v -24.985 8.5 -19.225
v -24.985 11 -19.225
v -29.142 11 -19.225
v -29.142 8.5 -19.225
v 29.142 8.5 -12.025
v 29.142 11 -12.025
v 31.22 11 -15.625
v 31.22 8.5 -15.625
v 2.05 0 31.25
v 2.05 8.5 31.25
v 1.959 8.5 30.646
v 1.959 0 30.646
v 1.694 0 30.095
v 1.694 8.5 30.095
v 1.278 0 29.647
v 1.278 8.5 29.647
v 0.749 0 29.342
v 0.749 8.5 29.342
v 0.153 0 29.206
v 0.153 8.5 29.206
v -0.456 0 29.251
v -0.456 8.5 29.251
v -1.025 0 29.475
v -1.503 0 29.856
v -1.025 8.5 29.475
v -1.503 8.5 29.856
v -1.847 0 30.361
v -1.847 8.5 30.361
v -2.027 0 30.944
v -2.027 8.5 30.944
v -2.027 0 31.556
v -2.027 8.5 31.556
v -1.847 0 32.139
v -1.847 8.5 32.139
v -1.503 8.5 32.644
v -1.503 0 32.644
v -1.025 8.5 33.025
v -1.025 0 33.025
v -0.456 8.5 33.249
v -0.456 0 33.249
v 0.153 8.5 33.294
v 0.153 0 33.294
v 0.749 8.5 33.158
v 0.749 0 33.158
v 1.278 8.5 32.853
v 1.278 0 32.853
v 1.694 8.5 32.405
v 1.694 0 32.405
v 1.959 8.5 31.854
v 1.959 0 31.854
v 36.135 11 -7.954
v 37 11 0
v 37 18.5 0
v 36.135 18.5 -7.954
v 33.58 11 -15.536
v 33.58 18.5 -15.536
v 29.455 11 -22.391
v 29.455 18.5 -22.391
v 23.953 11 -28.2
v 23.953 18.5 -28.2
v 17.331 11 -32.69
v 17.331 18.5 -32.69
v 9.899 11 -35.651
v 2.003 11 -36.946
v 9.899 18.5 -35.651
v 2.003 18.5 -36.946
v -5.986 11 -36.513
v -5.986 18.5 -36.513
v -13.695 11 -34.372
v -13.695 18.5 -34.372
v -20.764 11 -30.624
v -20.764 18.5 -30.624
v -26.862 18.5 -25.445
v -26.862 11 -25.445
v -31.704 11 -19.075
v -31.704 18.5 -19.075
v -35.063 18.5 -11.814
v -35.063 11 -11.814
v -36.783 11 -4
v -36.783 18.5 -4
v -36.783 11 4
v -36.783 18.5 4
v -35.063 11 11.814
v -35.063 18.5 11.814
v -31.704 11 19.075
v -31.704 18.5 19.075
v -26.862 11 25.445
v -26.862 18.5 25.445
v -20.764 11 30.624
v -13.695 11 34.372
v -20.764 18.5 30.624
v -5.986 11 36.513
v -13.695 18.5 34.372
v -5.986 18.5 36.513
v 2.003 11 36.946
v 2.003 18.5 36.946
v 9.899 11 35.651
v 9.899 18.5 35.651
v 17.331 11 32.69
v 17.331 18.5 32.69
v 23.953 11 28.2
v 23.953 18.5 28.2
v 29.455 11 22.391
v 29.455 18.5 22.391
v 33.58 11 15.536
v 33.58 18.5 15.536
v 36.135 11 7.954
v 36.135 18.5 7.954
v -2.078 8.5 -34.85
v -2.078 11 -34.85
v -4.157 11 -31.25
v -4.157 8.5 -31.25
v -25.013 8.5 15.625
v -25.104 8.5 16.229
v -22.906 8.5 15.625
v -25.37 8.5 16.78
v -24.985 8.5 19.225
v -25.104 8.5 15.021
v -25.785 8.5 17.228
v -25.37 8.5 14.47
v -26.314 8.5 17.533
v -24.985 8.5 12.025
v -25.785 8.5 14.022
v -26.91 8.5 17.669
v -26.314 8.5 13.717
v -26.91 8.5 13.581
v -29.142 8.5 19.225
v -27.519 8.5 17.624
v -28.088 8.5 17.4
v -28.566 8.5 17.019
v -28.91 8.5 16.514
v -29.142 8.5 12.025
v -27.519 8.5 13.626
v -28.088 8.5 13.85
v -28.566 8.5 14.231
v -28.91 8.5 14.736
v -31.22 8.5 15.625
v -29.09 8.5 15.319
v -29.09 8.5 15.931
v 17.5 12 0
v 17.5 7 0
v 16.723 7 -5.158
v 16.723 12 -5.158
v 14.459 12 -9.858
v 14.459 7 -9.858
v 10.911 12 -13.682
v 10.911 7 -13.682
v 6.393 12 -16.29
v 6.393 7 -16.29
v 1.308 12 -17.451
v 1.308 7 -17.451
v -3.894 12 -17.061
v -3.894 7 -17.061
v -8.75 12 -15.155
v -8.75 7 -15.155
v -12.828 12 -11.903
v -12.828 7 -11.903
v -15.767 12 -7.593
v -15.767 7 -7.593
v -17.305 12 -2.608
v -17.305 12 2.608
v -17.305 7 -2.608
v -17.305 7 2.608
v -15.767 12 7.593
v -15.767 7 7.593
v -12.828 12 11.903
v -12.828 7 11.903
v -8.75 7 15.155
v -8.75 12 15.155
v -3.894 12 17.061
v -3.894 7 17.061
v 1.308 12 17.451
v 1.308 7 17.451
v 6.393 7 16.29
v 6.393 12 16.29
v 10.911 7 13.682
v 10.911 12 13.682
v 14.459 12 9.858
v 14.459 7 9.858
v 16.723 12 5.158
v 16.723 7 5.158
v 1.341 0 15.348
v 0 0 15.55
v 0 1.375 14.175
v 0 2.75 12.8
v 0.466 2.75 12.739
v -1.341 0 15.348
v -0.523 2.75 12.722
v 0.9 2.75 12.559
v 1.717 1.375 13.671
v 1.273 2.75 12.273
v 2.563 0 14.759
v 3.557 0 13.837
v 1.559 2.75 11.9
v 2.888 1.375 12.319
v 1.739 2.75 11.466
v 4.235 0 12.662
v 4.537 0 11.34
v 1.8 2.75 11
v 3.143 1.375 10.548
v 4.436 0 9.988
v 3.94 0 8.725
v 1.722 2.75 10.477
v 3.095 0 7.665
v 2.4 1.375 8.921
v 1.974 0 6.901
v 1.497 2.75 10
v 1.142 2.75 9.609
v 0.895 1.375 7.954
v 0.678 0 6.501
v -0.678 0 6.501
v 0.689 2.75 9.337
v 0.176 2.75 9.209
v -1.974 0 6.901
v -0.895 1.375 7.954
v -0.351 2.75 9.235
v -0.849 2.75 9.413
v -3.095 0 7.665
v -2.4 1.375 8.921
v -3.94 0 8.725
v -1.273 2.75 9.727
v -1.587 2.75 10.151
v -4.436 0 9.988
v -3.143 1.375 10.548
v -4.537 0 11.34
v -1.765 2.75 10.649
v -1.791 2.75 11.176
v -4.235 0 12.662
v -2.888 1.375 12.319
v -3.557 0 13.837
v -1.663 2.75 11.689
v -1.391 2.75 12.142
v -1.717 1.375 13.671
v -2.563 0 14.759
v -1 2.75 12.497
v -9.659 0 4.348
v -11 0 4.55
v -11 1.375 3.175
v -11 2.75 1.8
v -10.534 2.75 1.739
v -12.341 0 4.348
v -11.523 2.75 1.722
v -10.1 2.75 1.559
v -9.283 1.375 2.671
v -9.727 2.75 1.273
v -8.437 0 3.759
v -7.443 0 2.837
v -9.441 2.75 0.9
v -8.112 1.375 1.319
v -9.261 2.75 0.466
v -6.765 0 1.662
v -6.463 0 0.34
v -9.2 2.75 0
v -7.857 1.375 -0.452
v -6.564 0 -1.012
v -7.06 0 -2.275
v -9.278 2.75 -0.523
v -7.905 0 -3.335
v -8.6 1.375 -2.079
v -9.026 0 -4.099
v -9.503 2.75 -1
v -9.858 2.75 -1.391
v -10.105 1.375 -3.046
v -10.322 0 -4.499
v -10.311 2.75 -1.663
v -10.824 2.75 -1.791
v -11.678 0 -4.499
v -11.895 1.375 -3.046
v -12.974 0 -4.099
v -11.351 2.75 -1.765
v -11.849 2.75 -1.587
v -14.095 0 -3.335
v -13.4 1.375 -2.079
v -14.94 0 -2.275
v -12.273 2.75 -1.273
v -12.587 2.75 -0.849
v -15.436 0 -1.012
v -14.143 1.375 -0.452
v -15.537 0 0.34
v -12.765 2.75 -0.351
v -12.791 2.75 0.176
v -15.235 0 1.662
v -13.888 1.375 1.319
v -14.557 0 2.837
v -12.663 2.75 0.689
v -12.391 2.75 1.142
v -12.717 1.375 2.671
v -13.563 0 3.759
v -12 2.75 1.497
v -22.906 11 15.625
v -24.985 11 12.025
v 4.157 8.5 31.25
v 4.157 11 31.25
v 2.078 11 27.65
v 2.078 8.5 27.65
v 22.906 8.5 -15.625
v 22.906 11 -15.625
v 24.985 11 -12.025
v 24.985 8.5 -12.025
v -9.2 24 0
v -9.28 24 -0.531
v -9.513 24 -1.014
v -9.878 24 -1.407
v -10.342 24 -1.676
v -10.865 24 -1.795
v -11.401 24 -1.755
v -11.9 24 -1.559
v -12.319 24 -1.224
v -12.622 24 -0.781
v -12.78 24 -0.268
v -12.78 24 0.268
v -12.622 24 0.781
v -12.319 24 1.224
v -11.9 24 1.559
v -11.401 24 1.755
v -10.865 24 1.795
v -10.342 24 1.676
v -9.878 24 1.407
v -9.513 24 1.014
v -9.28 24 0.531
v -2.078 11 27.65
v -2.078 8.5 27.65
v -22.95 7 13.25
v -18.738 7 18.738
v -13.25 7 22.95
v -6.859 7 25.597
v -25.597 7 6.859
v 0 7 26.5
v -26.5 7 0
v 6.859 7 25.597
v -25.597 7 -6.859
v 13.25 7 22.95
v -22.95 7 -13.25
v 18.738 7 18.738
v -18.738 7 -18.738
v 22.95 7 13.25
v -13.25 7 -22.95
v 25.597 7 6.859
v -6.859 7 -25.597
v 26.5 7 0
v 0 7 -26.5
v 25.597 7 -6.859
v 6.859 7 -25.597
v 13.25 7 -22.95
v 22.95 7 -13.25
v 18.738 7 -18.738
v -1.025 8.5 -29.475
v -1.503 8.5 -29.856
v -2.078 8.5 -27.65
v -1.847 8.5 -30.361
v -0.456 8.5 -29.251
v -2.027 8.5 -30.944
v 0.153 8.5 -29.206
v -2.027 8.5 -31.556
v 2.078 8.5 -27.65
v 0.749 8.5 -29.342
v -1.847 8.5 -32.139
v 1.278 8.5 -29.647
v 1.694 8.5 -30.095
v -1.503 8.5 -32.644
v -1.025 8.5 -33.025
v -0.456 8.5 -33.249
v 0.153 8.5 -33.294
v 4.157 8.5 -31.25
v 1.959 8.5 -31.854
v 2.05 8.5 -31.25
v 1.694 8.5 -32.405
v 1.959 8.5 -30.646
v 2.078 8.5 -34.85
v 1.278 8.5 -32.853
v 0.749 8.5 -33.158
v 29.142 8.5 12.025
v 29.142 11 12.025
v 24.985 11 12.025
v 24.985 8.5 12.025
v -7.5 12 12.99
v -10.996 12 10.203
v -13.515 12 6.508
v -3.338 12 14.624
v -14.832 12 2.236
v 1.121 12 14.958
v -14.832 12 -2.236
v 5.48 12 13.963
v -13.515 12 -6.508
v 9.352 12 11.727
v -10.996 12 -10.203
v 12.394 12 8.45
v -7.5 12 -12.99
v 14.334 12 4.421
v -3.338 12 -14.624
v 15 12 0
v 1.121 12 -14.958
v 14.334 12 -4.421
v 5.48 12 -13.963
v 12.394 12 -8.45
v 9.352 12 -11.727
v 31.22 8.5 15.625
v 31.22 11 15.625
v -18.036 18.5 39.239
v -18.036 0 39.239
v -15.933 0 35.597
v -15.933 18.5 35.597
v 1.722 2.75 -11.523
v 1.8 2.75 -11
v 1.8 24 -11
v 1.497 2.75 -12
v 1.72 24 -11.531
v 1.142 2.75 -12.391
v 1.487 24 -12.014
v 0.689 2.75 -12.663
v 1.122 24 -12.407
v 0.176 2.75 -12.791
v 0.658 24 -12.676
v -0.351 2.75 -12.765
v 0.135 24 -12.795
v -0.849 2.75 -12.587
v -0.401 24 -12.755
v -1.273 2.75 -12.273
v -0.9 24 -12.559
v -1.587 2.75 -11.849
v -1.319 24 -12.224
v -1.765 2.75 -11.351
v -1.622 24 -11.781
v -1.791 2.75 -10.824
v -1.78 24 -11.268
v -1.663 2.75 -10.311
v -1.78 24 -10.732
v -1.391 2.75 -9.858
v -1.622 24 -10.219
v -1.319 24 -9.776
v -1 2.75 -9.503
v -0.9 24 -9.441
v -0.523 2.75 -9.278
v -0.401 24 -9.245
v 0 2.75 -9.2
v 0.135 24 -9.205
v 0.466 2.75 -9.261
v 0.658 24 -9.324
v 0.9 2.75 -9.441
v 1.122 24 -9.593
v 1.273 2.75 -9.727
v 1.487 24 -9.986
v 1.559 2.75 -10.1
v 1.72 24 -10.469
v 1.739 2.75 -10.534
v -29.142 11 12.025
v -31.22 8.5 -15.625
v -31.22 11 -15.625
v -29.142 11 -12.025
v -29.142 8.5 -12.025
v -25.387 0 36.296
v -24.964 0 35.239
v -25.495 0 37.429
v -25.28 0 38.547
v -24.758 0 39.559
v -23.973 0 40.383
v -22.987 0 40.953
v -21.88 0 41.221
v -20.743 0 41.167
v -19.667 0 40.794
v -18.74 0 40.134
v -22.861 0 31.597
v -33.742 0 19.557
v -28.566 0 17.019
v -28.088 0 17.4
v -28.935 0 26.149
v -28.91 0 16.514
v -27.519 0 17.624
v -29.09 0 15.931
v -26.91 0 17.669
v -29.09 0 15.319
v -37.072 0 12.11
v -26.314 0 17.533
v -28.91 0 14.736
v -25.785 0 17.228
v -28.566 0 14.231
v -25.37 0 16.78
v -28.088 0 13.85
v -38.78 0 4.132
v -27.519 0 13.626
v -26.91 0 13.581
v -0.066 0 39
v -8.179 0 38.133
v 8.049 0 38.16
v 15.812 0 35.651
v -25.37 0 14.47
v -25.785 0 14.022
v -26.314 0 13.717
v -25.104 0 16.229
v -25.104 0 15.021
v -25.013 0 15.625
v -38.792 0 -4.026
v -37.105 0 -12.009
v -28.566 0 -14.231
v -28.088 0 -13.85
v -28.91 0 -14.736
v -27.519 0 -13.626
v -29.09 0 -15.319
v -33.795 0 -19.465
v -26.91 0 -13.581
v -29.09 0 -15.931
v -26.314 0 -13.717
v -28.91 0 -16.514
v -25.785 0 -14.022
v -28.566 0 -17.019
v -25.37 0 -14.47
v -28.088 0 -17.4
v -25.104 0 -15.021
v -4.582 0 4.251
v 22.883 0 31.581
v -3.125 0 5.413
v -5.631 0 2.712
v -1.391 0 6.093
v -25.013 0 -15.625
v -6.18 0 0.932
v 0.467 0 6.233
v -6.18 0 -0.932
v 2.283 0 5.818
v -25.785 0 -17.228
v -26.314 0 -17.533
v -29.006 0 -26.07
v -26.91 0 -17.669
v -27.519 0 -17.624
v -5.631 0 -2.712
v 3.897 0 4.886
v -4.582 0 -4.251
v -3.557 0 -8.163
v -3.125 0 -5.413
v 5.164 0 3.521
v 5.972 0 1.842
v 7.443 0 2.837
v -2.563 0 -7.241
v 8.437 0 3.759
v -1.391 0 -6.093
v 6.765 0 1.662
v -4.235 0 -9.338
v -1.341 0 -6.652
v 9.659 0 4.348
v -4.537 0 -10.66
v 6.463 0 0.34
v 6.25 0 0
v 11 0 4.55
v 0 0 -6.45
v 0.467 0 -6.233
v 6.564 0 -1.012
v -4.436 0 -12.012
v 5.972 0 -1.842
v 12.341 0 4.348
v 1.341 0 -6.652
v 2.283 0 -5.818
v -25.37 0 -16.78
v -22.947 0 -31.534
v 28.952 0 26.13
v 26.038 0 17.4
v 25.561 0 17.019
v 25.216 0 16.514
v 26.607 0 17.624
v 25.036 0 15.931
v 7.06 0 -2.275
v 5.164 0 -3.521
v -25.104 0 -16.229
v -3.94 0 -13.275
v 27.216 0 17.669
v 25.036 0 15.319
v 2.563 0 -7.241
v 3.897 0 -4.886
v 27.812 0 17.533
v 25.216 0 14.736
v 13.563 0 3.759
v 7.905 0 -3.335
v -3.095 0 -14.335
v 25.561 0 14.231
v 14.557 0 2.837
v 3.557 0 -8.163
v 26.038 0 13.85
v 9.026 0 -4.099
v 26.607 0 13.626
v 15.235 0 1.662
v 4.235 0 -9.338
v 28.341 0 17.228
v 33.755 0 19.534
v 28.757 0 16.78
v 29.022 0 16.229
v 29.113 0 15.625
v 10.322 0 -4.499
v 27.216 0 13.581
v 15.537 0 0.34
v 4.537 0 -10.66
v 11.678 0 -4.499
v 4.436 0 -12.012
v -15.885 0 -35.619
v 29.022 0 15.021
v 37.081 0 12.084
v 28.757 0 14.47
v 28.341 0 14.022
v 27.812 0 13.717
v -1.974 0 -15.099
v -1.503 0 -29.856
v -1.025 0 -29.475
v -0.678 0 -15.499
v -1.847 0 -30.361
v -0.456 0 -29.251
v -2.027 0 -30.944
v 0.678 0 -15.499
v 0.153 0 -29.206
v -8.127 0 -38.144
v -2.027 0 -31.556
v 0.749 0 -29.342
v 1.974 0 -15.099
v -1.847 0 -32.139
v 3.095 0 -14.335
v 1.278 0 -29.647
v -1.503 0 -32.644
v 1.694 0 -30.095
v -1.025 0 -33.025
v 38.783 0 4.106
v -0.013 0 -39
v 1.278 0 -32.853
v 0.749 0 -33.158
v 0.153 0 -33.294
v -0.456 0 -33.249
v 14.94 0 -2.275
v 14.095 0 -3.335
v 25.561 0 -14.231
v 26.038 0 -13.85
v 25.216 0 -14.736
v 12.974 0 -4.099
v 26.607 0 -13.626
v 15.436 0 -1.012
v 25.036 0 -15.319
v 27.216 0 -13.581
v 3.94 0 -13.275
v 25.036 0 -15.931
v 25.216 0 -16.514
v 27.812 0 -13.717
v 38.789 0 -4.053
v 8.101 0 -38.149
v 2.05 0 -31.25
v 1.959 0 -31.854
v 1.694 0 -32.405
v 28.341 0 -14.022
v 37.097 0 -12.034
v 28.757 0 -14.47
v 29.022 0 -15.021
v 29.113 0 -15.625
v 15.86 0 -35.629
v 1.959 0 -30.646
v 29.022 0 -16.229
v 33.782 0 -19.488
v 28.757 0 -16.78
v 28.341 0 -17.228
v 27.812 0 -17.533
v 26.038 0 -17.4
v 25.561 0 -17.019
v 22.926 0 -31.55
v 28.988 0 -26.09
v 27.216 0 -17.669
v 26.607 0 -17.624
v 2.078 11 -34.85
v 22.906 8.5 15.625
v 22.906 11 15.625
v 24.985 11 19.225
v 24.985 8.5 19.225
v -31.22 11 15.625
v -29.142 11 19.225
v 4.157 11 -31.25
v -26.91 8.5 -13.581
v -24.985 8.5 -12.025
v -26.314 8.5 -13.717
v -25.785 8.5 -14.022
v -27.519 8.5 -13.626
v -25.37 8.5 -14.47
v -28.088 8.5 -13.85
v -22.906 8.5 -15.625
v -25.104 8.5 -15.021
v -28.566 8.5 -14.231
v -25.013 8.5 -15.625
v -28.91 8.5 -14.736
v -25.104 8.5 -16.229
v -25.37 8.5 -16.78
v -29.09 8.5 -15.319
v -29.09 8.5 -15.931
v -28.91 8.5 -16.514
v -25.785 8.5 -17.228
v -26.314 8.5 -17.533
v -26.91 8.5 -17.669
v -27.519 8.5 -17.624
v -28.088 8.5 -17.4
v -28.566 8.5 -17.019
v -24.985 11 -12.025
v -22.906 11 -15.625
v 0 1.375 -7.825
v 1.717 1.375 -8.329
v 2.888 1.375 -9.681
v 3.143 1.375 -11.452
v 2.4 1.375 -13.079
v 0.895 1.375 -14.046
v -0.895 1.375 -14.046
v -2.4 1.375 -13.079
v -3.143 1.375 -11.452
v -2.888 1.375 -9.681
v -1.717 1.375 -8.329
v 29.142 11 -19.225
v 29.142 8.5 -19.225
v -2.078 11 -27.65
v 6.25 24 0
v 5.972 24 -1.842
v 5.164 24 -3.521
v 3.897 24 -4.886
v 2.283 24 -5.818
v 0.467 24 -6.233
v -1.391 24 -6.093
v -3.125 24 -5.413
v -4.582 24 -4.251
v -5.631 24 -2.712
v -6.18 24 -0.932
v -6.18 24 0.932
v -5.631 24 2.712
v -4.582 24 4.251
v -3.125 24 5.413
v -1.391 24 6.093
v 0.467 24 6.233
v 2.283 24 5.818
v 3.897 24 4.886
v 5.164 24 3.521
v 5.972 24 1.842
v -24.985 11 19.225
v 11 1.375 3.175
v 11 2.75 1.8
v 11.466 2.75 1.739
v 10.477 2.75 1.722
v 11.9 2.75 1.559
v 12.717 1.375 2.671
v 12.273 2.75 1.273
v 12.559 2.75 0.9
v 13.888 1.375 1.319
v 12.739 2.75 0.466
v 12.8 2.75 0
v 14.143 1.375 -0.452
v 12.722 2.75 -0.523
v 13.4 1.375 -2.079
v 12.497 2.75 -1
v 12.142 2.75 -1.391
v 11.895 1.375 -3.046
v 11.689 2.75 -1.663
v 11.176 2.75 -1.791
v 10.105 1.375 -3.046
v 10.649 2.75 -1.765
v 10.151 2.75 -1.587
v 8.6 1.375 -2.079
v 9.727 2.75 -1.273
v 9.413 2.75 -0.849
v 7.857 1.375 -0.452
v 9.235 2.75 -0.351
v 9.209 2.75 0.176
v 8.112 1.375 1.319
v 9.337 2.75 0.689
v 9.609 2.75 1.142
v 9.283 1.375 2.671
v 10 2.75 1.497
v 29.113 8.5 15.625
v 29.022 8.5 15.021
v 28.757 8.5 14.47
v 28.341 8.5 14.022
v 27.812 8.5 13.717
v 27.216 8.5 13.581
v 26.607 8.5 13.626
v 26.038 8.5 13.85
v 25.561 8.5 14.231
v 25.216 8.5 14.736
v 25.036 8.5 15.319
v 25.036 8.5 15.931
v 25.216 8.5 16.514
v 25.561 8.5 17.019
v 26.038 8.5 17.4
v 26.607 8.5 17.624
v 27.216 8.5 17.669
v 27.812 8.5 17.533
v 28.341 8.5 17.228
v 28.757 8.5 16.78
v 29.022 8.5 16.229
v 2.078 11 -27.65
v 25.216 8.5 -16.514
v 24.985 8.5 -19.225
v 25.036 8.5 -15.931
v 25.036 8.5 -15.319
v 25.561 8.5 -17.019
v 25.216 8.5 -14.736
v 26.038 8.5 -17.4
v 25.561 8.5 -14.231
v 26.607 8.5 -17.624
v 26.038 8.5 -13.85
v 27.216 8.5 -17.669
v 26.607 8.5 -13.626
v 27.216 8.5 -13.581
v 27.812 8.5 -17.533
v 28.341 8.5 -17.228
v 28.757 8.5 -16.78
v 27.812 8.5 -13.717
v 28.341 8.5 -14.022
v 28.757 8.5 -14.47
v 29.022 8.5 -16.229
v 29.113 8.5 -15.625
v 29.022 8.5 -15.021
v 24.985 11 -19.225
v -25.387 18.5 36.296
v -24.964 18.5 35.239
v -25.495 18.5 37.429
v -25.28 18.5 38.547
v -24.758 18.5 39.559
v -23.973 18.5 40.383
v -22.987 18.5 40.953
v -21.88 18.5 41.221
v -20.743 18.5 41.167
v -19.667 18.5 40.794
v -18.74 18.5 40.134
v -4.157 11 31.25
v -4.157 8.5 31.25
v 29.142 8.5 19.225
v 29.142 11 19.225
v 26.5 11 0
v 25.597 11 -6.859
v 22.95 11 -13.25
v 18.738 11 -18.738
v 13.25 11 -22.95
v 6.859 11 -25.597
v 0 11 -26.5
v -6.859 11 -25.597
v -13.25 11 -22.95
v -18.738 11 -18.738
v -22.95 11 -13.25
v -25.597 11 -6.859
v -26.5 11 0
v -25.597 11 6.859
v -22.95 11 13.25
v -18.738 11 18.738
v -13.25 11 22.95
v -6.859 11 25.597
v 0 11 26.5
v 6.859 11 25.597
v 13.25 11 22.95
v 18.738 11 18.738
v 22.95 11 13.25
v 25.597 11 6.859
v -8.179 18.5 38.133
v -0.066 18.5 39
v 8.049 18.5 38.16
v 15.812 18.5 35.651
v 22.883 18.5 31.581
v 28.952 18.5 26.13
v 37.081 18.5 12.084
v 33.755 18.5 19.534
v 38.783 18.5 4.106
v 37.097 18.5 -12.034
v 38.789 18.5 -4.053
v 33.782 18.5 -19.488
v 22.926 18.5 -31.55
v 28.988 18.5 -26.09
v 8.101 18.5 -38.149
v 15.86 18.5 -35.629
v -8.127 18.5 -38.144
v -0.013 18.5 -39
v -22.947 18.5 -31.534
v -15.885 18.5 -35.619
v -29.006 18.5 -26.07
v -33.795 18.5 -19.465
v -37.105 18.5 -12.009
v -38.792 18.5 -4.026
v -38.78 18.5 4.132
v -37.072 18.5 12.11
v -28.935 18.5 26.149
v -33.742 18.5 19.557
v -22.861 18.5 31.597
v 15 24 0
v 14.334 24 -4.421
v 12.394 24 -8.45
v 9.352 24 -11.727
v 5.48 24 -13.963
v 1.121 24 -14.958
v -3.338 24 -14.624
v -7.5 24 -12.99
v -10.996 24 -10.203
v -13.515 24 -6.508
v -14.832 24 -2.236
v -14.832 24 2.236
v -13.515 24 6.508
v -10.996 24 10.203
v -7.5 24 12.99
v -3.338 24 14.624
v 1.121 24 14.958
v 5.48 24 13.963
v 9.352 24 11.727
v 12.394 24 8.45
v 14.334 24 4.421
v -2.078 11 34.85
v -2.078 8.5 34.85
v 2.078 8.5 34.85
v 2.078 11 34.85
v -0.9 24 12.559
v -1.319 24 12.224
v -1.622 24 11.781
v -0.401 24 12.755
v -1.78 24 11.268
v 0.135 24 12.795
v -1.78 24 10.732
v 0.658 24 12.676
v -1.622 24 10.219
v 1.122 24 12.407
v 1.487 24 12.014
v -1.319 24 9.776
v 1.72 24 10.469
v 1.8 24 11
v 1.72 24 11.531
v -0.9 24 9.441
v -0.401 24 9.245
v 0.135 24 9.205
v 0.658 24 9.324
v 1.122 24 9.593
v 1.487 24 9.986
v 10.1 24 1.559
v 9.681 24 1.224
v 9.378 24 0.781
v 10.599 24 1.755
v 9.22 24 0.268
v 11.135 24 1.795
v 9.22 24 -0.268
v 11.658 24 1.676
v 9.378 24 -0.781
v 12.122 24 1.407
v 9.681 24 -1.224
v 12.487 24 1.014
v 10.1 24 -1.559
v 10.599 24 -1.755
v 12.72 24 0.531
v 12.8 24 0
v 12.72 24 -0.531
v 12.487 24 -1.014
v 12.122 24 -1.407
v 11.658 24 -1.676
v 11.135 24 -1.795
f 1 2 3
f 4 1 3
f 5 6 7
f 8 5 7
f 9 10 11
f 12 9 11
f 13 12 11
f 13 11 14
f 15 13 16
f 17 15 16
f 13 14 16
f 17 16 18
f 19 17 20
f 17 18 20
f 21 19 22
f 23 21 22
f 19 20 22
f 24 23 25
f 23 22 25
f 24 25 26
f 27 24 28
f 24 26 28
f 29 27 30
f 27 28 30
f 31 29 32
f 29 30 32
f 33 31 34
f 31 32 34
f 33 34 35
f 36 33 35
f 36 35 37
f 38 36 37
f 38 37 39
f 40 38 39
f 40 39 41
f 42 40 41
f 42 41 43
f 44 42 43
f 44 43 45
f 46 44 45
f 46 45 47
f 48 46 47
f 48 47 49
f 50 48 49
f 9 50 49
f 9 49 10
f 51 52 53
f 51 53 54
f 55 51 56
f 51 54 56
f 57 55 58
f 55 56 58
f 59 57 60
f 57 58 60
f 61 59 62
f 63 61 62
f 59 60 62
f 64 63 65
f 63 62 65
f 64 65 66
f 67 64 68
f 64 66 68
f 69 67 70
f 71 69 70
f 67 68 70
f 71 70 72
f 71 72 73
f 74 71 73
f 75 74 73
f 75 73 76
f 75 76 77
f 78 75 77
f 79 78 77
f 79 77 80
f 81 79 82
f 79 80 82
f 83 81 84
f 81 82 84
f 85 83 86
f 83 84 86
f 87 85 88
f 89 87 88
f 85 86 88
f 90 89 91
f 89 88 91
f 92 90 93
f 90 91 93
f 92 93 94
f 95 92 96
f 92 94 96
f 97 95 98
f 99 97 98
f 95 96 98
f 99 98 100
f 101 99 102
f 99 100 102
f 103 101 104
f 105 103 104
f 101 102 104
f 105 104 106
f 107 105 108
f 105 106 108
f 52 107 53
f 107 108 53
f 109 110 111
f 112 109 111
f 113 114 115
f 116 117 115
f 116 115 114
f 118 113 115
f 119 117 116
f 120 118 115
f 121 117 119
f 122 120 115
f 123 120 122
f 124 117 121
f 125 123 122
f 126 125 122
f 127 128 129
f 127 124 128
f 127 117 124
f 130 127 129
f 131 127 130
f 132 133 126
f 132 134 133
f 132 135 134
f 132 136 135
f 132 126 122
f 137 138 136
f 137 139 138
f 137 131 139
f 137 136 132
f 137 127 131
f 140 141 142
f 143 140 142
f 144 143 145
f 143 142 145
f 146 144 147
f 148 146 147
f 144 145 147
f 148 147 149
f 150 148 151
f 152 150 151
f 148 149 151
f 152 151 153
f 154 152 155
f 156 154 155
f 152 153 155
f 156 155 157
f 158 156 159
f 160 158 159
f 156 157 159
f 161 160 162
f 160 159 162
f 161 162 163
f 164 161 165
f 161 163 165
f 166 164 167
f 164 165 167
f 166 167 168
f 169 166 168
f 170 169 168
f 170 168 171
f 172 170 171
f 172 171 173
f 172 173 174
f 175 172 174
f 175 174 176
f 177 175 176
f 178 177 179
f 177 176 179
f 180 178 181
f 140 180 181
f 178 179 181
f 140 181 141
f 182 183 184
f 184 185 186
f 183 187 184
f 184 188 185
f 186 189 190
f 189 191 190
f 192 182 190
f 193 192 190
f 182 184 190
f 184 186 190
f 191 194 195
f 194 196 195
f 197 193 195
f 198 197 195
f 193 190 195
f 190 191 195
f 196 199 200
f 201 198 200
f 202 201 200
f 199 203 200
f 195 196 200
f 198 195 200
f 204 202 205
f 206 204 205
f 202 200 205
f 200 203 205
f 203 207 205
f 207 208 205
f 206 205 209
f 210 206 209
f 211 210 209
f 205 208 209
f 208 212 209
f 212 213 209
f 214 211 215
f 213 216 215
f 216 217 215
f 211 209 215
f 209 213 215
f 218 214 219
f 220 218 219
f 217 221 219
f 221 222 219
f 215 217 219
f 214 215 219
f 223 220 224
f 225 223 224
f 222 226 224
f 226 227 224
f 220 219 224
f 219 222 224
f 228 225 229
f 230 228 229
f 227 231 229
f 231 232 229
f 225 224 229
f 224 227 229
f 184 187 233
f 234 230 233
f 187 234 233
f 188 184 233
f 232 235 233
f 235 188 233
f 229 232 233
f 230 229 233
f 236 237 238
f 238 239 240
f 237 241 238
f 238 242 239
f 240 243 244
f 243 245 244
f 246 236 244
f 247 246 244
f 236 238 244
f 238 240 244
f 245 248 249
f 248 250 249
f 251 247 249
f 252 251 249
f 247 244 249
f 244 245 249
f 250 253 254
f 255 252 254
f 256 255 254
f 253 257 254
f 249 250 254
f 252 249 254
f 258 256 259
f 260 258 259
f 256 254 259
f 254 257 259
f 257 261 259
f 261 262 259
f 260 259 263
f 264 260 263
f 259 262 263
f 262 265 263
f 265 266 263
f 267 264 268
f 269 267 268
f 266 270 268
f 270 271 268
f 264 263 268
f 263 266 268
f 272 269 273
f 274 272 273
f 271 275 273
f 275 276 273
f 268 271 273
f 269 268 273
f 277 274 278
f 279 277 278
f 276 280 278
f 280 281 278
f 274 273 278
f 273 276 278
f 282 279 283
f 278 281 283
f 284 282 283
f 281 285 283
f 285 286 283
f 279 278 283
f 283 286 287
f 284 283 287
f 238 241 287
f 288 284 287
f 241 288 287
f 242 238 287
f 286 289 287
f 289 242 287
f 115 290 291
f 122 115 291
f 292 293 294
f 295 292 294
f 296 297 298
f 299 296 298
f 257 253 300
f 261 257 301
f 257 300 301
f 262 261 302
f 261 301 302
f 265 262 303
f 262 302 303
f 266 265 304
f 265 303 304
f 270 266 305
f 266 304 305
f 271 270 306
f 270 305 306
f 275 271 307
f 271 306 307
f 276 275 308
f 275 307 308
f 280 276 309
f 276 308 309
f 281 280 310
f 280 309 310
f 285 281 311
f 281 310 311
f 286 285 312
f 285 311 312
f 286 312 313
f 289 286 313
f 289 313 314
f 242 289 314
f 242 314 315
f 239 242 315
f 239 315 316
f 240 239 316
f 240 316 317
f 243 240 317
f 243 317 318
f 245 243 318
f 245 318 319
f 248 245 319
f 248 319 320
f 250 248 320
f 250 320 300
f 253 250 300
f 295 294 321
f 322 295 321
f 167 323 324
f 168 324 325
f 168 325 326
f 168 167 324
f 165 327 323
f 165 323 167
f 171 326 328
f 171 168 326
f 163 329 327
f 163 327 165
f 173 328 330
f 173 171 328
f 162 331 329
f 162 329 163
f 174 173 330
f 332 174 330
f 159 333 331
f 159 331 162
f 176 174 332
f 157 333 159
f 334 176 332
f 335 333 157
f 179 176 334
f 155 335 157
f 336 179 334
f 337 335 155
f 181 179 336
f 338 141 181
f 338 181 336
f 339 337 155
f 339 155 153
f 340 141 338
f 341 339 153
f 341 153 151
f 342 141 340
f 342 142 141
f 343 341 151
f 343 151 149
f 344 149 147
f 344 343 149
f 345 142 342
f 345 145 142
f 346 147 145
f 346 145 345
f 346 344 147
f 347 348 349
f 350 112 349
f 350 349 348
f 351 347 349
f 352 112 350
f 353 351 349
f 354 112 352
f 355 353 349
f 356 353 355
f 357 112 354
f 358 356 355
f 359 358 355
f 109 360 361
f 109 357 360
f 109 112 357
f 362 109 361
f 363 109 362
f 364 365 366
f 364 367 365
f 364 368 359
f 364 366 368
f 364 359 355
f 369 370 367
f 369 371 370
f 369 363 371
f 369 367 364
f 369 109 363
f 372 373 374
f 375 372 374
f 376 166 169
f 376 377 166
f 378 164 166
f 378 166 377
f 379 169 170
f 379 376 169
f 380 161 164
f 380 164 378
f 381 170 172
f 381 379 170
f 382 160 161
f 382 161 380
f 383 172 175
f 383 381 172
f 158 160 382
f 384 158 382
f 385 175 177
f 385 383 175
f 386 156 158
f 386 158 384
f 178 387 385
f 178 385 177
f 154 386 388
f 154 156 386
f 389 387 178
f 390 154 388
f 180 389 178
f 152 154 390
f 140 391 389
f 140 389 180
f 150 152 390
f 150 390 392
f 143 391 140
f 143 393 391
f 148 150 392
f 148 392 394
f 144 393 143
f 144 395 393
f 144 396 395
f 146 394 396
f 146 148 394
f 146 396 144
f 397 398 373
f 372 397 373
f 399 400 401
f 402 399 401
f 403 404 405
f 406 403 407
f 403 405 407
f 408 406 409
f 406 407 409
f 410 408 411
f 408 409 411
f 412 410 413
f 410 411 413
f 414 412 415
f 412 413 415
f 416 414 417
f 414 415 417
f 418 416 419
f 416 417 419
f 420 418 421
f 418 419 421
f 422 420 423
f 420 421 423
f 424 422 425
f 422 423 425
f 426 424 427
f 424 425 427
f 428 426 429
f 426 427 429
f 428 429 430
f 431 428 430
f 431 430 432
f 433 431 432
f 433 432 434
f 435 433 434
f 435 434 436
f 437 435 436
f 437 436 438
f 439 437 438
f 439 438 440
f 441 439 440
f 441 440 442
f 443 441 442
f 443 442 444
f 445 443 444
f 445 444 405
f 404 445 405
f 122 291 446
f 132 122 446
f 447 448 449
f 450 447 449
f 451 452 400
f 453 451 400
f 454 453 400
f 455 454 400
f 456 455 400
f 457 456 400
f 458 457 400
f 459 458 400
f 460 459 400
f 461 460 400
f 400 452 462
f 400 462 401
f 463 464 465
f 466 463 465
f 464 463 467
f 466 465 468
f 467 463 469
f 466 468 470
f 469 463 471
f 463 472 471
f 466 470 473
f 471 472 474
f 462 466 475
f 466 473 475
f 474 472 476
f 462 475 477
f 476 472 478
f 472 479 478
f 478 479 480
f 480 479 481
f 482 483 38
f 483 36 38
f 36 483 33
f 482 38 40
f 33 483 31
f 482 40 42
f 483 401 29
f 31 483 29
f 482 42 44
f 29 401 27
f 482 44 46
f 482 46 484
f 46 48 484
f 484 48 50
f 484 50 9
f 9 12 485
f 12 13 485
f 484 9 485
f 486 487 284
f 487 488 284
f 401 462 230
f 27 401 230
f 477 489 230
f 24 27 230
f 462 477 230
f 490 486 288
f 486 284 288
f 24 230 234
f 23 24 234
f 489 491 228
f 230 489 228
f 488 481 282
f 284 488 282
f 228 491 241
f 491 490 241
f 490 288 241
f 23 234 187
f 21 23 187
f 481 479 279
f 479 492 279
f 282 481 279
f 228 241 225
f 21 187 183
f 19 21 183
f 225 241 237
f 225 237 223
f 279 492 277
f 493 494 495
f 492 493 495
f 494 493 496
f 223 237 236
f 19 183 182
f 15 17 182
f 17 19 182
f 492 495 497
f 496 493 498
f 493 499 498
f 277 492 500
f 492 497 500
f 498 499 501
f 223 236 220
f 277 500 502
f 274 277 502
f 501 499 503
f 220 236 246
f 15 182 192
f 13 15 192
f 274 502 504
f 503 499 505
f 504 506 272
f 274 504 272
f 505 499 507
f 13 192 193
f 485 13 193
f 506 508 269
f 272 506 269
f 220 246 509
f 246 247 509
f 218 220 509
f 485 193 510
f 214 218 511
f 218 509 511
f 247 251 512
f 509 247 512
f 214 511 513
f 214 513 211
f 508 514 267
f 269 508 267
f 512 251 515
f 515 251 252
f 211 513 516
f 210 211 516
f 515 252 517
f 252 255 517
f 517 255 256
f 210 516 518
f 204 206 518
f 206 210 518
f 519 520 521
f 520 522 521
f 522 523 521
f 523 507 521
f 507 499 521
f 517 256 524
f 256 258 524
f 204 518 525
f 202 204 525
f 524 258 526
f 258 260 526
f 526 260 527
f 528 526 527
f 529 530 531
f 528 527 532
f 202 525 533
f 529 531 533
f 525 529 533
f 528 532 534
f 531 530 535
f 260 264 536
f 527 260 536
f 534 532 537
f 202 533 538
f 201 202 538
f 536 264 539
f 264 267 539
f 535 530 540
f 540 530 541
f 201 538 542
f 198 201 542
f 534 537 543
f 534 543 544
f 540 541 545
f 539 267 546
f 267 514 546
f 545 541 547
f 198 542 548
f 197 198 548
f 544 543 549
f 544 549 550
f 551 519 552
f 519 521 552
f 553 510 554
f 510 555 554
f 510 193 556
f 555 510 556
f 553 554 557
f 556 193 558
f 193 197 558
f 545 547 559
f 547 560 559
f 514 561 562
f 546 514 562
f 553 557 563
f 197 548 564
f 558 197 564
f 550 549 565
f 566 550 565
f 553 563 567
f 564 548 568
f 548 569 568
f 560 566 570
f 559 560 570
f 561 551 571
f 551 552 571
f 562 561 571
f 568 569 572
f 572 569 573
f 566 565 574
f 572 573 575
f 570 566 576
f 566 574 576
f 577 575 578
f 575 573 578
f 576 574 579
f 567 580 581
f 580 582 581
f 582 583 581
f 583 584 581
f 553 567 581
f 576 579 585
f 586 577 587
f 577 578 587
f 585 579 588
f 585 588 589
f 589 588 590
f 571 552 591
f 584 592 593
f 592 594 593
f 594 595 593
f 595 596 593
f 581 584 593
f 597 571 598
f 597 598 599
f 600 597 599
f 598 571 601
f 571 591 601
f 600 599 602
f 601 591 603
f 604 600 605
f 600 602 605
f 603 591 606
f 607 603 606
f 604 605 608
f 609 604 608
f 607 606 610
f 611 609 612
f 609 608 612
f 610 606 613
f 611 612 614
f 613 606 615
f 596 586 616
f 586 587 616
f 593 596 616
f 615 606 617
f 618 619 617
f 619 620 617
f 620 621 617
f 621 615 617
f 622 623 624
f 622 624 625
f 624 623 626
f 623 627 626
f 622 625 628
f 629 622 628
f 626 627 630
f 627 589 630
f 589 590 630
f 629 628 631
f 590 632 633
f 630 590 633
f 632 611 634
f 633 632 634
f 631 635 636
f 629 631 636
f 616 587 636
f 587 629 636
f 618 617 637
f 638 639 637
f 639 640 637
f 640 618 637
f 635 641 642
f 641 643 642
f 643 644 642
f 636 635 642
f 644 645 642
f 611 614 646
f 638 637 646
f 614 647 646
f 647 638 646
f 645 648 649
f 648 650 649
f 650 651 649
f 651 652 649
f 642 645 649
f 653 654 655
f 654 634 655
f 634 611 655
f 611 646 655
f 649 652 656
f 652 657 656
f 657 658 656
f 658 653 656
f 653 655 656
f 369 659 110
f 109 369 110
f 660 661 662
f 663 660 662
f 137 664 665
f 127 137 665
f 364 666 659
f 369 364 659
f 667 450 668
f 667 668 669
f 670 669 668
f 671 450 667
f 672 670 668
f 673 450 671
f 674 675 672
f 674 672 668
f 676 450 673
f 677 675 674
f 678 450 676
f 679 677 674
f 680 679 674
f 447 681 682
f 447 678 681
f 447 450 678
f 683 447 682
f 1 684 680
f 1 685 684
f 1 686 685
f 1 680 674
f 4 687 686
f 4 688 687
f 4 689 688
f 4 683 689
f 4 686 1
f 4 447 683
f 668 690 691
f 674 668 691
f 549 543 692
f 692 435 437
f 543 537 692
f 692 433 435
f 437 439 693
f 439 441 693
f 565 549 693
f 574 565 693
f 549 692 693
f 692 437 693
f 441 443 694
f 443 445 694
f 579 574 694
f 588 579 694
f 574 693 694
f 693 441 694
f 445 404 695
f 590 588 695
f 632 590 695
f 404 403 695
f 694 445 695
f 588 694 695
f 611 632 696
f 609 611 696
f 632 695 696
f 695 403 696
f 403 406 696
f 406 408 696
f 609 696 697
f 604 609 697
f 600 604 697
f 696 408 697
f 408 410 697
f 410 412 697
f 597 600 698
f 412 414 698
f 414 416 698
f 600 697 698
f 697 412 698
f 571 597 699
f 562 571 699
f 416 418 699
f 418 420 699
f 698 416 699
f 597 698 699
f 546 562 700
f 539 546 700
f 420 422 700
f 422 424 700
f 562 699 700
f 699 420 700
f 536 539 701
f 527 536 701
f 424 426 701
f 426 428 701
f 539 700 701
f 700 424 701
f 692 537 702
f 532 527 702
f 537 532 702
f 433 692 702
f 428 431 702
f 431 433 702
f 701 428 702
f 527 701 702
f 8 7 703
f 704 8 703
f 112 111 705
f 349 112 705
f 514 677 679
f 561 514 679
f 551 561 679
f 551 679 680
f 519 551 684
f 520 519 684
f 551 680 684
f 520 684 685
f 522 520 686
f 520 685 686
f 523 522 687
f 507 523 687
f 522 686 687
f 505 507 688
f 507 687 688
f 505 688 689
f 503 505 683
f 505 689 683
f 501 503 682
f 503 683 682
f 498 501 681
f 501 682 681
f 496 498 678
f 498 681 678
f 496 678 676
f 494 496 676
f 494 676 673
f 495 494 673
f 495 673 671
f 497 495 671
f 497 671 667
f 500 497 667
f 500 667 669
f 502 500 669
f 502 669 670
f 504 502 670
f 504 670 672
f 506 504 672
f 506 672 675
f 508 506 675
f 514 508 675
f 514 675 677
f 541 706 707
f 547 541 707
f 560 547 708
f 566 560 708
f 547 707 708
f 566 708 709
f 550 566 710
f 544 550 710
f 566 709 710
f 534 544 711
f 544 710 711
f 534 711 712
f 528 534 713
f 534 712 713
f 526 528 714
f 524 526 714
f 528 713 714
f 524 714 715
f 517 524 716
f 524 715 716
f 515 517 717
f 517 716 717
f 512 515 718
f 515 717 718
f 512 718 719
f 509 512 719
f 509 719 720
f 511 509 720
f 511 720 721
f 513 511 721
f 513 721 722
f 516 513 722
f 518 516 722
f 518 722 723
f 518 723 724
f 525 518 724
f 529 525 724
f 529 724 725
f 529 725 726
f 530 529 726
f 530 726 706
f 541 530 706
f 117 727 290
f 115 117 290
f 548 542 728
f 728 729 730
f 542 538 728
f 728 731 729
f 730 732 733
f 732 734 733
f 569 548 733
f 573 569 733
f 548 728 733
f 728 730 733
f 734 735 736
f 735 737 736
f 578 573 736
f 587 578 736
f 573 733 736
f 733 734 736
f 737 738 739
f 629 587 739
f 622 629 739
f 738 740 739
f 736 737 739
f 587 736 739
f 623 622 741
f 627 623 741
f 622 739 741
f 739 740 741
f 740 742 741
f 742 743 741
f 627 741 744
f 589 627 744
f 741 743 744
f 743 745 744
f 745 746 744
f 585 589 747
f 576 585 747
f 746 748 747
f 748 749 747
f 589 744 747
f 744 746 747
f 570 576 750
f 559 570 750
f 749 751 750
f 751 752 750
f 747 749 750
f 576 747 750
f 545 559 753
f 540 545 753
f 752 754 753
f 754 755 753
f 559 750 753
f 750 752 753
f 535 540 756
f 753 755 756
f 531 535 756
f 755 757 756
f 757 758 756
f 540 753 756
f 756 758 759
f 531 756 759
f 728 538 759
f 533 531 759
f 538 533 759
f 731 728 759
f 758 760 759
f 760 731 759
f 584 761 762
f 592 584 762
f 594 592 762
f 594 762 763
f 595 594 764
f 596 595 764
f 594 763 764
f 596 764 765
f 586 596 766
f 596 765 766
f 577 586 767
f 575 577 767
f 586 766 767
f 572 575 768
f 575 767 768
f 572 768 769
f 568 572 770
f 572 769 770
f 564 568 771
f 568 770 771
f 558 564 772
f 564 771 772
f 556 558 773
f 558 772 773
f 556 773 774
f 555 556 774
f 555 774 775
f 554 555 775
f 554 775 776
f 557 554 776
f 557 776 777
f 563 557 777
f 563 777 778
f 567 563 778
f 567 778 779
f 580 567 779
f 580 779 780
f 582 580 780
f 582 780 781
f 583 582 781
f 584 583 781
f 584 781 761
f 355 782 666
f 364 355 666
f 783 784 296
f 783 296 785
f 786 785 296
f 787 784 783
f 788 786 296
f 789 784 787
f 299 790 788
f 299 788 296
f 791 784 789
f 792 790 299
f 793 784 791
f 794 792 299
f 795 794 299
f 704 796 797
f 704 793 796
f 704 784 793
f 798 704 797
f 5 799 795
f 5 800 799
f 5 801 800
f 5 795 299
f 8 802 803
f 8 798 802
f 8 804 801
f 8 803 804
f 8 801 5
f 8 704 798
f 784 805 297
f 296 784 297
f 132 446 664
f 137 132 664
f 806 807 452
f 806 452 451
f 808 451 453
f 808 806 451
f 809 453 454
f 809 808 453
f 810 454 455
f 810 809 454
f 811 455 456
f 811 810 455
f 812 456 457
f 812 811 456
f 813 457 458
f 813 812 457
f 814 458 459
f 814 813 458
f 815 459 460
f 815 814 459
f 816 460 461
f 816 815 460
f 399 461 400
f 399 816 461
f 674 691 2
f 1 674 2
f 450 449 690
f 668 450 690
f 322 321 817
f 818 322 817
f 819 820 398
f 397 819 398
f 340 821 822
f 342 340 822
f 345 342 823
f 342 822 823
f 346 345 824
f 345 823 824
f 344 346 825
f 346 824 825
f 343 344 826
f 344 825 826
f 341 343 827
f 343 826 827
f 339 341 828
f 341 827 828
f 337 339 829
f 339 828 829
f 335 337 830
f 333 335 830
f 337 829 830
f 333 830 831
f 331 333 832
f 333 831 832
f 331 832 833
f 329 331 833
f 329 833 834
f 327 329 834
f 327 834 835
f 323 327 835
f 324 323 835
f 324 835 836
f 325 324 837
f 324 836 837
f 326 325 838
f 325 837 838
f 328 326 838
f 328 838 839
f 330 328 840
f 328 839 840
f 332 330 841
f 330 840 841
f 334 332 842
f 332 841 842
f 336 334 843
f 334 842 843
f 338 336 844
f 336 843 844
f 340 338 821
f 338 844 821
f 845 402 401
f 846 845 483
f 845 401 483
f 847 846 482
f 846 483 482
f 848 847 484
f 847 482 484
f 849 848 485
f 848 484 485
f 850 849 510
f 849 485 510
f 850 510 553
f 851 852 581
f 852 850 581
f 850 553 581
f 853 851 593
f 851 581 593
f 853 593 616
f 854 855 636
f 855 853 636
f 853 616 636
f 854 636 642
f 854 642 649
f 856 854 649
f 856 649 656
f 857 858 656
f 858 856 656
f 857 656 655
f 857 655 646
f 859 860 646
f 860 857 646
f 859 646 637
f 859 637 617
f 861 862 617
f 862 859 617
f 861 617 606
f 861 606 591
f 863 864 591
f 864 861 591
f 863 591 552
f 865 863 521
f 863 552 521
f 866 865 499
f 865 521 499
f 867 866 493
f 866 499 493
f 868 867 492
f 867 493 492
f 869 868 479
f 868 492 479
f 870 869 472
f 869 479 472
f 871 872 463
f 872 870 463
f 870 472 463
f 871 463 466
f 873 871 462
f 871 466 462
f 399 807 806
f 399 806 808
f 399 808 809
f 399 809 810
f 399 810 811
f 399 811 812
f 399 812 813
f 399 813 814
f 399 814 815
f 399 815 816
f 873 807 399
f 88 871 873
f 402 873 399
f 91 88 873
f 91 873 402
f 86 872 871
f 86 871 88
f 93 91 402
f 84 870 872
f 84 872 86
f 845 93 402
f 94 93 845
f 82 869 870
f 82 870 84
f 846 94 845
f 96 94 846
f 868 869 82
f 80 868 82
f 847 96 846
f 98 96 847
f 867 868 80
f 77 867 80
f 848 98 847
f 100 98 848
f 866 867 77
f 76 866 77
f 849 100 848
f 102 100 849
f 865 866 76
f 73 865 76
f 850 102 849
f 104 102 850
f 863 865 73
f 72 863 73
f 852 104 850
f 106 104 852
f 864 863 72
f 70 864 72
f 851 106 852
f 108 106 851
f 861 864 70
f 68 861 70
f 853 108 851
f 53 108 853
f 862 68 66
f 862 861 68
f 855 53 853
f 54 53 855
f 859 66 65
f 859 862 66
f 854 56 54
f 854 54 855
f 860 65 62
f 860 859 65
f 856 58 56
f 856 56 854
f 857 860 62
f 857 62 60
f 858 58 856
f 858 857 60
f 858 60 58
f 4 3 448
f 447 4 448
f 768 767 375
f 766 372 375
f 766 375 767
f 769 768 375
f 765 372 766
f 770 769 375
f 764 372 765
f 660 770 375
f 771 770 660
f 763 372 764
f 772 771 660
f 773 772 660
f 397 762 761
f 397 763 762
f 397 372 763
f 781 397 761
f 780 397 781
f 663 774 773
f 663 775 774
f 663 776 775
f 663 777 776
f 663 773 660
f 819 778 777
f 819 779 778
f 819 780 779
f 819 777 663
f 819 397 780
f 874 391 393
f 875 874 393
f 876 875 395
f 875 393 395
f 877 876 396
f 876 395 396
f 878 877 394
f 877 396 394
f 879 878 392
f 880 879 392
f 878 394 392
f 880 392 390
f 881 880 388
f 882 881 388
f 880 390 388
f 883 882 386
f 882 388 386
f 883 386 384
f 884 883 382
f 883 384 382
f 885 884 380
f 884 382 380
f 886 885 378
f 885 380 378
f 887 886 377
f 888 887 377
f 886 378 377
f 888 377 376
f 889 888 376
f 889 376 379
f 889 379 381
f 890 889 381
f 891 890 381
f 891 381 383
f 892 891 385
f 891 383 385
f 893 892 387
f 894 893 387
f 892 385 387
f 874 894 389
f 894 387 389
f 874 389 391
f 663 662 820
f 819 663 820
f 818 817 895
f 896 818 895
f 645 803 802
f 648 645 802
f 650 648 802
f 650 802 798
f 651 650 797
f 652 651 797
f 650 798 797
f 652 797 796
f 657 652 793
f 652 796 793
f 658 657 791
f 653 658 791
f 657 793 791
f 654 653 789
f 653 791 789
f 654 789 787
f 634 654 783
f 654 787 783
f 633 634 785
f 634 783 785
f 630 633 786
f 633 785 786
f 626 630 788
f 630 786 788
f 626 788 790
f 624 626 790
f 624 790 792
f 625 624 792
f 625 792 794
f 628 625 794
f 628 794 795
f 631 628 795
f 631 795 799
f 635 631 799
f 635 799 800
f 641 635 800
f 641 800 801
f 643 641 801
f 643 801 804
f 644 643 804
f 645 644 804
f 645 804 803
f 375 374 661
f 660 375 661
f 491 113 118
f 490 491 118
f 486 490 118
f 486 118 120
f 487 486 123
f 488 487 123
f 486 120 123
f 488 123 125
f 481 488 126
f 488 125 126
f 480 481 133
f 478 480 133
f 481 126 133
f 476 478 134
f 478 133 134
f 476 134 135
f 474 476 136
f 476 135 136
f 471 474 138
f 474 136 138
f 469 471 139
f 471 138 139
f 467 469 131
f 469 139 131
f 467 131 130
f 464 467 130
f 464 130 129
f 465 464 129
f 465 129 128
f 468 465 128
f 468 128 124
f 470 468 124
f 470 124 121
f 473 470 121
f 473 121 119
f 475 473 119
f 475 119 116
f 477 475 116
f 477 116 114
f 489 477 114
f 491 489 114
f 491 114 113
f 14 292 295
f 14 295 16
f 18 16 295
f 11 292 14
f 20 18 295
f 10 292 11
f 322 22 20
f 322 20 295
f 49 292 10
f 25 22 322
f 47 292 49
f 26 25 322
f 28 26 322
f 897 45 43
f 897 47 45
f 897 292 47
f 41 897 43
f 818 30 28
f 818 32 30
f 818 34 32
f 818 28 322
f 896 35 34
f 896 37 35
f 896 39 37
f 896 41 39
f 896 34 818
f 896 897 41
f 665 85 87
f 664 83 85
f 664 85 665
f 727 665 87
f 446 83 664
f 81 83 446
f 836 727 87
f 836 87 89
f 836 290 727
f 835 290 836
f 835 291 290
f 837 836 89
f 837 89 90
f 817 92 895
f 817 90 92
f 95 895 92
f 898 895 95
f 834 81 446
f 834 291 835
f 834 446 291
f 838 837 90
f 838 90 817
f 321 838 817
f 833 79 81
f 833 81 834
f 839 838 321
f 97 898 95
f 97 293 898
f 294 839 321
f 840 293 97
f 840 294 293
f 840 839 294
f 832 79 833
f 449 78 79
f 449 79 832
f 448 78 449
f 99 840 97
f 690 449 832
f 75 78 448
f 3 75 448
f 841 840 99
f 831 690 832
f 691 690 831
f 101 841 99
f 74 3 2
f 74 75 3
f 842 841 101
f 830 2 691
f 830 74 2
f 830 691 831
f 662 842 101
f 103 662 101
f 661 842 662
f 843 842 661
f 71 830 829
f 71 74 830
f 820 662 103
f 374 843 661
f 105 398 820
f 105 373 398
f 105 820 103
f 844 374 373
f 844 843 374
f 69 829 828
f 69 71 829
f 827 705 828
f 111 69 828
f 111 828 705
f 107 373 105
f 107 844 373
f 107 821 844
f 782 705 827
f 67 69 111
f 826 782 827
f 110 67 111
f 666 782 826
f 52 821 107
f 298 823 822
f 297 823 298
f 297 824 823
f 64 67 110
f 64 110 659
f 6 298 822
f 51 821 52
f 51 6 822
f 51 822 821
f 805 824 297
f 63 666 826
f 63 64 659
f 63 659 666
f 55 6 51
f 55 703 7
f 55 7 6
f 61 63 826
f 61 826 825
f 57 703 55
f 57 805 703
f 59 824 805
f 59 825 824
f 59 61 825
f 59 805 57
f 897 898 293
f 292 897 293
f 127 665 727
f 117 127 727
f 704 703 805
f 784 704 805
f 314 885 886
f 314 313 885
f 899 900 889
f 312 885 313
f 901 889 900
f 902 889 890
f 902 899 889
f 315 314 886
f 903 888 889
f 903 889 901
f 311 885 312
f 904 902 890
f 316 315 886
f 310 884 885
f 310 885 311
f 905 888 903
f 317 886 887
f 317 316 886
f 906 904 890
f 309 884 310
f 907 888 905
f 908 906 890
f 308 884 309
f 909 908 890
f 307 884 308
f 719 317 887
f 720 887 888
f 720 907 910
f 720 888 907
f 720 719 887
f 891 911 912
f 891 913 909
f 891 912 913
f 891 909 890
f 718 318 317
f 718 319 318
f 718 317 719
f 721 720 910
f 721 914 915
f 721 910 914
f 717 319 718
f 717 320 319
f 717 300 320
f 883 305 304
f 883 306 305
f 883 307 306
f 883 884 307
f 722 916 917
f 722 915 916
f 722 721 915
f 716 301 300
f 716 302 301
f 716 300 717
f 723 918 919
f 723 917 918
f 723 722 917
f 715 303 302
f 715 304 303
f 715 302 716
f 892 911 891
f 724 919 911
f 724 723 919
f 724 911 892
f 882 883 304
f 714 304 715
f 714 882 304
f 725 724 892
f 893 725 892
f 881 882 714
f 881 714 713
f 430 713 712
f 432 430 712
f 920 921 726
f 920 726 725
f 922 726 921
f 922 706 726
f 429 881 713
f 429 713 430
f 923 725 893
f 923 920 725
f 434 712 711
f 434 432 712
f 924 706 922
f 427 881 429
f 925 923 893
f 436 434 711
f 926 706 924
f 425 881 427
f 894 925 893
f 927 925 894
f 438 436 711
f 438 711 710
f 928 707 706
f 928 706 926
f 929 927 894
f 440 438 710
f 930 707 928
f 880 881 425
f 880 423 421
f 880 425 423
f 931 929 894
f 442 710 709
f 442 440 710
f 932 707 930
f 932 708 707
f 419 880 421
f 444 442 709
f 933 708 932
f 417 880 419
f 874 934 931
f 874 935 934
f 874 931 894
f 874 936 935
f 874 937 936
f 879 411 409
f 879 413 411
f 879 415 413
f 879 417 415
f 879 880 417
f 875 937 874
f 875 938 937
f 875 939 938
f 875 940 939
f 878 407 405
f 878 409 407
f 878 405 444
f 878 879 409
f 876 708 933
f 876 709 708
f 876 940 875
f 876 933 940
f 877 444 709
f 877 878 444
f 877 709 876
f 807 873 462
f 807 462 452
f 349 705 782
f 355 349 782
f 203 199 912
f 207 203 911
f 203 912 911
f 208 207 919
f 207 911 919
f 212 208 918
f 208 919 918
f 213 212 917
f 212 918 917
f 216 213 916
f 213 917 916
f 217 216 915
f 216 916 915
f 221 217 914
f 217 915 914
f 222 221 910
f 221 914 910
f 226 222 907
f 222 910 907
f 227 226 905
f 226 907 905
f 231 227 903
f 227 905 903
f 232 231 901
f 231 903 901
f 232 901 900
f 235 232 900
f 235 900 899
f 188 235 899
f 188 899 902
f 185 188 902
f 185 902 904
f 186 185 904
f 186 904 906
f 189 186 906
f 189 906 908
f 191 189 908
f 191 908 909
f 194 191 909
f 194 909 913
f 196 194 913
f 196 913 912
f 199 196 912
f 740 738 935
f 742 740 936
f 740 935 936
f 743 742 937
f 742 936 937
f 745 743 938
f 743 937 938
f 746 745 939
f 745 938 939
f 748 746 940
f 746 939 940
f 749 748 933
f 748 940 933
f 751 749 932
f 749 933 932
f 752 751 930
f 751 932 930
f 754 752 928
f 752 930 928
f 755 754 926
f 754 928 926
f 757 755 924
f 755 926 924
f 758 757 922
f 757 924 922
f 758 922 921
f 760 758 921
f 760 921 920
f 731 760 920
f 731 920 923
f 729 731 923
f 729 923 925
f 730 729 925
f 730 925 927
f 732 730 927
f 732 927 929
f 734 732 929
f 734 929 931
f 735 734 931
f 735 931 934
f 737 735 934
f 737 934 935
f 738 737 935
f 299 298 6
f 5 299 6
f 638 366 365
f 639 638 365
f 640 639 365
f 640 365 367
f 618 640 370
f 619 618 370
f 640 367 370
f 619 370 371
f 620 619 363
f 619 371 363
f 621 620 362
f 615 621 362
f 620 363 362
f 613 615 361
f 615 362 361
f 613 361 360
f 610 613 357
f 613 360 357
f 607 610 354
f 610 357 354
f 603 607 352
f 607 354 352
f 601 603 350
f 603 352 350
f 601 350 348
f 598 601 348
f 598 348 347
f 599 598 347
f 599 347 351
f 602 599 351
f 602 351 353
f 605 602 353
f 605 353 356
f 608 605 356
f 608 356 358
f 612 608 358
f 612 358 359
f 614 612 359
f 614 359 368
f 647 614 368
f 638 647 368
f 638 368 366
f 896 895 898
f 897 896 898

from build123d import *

# Parameters (mm, degrees)
SKETCH1_R                                           = 39
BOSS_EXTRUDE1_DEPTH                                 = 18.5
SKETCH2_R                                           = 37
CUT_EXTRUDE1_DEPTH                                  = 7.5
SKETCH3_R                                           = 26.5
CUT_EXTRUDE2_DEPTH                                  = 4
SKETCH4_R                                           = 17.5
BOSS_EXTRUDE2_DEPTH                                 = 5
SKETCH5_R                                           = 15
BOSS_EXTRUDE3_DEPTH                                 = 12
SKETCH6_R                                           = 6.25
SKETCH6_R_2                                         = 1.8
CUT_EXTRUDE3_DEPTH                                  = 25
CSK_FOR_M4_COUNTERSUNK_FLAT_HEAD_SCREW1_D           = 3.5
CSK_FOR_M4_COUNTERSUNK_FLAT_HEAD_SCREW1_CSINK_D     = 9.1
CSK_FOR_M4_COUNTERSUNK_FLAT_HEAD_SCREW1_CSINK_ANGLE = 90
SKETCH9_R                                           = 2.05
CUT_EXTRUDE4_DEPTH                                  = 12.0000001
CUT_EXTRUDE5_DEPTH                                  = 2.5
CIRPATTERN1_COUNT                                   = 6
SKETCH11_R                                          = 4
BOSS_EXTRUDE5_DEPTH                                 = 18.5


with BuildPart() as part:
    # Sketch1 → Boss-Extrude1 (new body)
    with BuildSketch(Plane(origin=(0, 0, 0), x_dir=(1, 0, 0), z_dir=(0, 1, 0))):
        Circle(SKETCH1_R)
    extrude(amount=BOSS_EXTRUDE1_DEPTH)

    # Sketch2 → Cut-Extrude1 (cut)
    with BuildSketch(Plane(origin=(0, 18.5, 0), x_dir=(1, 0, 0), z_dir=(0, 1, 0))):
        Circle(SKETCH2_R)
    extrude(amount=-CUT_EXTRUDE1_DEPTH, mode=Mode.SUBTRACT)

    # Sketch3 → Cut-Extrude2 (cut)
    with BuildSketch(Plane(origin=(0, 11, 0), x_dir=(1, 0, 0), z_dir=(0, 1, 0))):
        Circle(SKETCH3_R)
    extrude(amount=-CUT_EXTRUDE2_DEPTH, mode=Mode.SUBTRACT)

    # Sketch4 → Boss-Extrude2 (add)
    with BuildSketch(Plane(origin=(0, 7, 0), x_dir=(1, 0, 0), z_dir=(0, 1, 0))):
        Circle(SKETCH4_R)
    extrude(amount=BOSS_EXTRUDE2_DEPTH)

    # Sketch5 → Boss-Extrude3 (add)
    with BuildSketch(Plane(origin=(0, 12, 0), x_dir=(1, 0, 0), z_dir=(0, 1, 0))):
        Circle(SKETCH5_R)
    extrude(amount=BOSS_EXTRUDE3_DEPTH)

    # Sketch6 → Cut-Extrude3 (cut, through all)
    with BuildSketch(Plane(origin=(0, 24, 0), x_dir=(1, 0, 0), z_dir=(0, 1, 0))):
        Circle(SKETCH6_R)
        with Locations((0, 11)):
            Circle(SKETCH6_R_2)
        with Locations((11, 0)):
            Circle(SKETCH6_R_2)
        with Locations((0, -11)):
            Circle(SKETCH6_R_2)
        with Locations((-11, 0)):
            Circle(SKETCH6_R_2)
    extrude(amount=-CUT_EXTRUDE3_DEPTH, mode=Mode.SUBTRACT)

    # CSK for M4 Countersunk Flat Head Screw1 (through all)
    with Locations(Plane(origin=(0, 0, 11), x_dir=(0, 0, -1), z_dir=(0, -1, 0))):
        with Locations((0, 0), (11, 11), (22, 0), (11, -11)):
            CounterSinkHole(CSK_FOR_M4_COUNTERSUNK_FLAT_HEAD_SCREW1_D / 2, CSK_FOR_M4_COUNTERSUNK_FLAT_HEAD_SCREW1_CSINK_D / 2, counter_sink_angle=CSK_FOR_M4_COUNTERSUNK_FLAT_HEAD_SCREW1_CSINK_ANGLE)

    # Sketch9 → Cut-Extrude4 (cut, through all)
    with BuildSketch(Plane(origin=(0, 11, 0), x_dir=(1, 0, 0), z_dir=(0, 1, 0))):
        with Locations((0, 31.25)):
            Circle(SKETCH9_R)
        with Locations((27.063293868, 15.625)):
            Circle(SKETCH9_R)
        with Locations((27.063293868, -15.625)):
            Circle(SKETCH9_R)
        with Locations((0, -31.25)):
            Circle(SKETCH9_R)
        with Locations((-27.063293868, -15.625)):
            Circle(SKETCH9_R)
        with Locations((-27.063293868, 15.625)):
            Circle(SKETCH9_R)
    extrude(amount=-CUT_EXTRUDE4_DEPTH, mode=Mode.SUBTRACT)

    # Sketch10 → Cut-Extrude5 (cut)
    with BuildSketch(Plane(origin=(0, 11, 0), x_dir=(1, 0, 0), z_dir=(0, 1, 0))):
        Polygon((2.078460969, 34.85), (-2.078460969, 34.85), (-4.156921938, 31.25), (-2.078460969, 27.65), (2.078460969, 27.65), (4.156921938, 31.25), align=None)
    cut_extrude5 = extrude(amount=-CUT_EXTRUDE5_DEPTH, mode=Mode.SUBTRACT)

    # CirPattern1: Cut-Extrude5 ×6 about axis
    cirpattern1_axis = Axis((0, 0, 0), (0, 1, 0))
    for i in range(1, CIRPATTERN1_COUNT):
        add(cut_extrude5.rotate(cirpattern1_axis, i * 360 / CIRPATTERN1_COUNT), mode=Mode.SUBTRACT)

    # Sketch11 → Boss-Extrude5 (add, through all)
    with BuildSketch(Plane(origin=(0, 18.5, 0), x_dir=(1, 0, 0), z_dir=(0, 1, 0))):
        with Locations((-21.5, -37.239092363)):
            Circle(SKETCH11_R)
        with BuildLine():
            ThreePointArc((-17.5, -37.239092363), (-17.636296695, -38.274368543), (-18.035898385, -39.239092363))
            Line((-18.035898385, -39.239092363), (-15.933063126, -35.596874855))
            ThreePointArc((-15.933063126, -35.596874855), (-17.739935267, -34.731753436), (-19.499999848, -33.774990835))
            ThreePointArc((-19.499999848, -33.774990835), (-18.035898341, -35.239092439), (-17.5, -37.239092363))
        make_face()
        with BuildLine():
            Line((-22.861266356, -31.596874855), (-24.964101615, -35.239092363))
            ThreePointArc((-24.964101615, -35.239092363), (-22.535276096, -33.375389035), (-19.499999848, -33.774990835))
            ThreePointArc((-19.499999848, -33.774990835), (-21.208613012, -32.729111416), (-22.861266356, -31.596874855))
        make_face()
    extrude(amount=-BOSS_EXTRUDE5_DEPTH)


solid = part.part
